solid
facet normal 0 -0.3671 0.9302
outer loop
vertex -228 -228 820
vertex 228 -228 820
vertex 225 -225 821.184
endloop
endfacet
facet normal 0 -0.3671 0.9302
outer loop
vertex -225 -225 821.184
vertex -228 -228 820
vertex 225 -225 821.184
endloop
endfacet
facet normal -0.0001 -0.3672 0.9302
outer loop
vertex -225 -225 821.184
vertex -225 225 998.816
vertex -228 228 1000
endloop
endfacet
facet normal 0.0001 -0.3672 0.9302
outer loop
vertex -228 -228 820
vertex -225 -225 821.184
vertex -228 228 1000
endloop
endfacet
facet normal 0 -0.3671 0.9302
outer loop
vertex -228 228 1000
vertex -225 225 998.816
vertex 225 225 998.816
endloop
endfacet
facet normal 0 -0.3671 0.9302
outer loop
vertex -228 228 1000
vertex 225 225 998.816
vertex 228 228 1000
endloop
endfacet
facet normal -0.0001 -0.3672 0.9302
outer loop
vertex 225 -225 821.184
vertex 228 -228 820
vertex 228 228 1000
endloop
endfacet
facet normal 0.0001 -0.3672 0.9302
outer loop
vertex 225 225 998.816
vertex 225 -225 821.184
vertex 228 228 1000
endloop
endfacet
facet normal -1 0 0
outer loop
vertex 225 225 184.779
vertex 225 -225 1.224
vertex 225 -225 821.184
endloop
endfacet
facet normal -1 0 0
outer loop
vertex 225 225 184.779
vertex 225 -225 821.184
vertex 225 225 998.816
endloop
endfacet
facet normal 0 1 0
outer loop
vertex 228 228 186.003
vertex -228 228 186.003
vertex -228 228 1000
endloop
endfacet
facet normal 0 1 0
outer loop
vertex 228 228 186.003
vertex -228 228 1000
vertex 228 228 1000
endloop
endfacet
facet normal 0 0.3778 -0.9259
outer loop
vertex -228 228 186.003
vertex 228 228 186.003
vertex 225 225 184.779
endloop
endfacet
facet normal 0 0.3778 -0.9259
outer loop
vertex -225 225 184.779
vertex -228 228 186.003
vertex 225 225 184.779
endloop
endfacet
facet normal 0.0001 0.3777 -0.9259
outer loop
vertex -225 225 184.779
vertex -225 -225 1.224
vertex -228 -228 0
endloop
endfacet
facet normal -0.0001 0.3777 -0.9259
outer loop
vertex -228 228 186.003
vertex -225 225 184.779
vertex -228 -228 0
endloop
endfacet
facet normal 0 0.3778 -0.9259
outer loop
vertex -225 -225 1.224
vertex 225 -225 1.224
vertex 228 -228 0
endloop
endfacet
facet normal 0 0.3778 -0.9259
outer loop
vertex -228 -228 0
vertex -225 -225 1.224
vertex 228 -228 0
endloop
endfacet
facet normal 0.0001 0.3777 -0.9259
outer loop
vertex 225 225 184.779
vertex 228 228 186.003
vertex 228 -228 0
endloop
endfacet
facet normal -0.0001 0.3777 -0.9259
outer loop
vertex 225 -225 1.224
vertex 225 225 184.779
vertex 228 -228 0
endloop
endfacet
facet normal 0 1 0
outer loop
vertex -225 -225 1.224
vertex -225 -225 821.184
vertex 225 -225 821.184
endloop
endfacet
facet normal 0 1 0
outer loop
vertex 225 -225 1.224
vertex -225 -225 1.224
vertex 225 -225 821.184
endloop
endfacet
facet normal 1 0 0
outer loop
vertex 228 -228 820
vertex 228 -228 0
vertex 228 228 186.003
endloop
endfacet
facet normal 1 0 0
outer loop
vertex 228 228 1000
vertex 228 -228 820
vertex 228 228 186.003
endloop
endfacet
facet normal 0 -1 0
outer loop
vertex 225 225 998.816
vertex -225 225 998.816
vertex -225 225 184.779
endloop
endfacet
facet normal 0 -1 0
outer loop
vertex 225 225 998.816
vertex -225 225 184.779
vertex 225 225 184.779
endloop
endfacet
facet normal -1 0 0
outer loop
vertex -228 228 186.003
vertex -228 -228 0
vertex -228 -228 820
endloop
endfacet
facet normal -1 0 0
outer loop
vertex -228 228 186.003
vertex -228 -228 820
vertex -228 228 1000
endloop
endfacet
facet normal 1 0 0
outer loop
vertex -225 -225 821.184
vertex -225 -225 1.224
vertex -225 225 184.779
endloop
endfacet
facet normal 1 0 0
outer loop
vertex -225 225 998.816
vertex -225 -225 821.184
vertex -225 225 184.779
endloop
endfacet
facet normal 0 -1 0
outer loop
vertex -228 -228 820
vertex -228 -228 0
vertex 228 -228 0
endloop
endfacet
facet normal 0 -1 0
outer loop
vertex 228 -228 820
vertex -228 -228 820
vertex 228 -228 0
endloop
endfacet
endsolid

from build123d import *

# Parameters (mm, degrees)
F0_W          = 456
F0_H          = 456
F0_W_2        = 450
F0_H_2        = 450
F2_DEPTH      = 1000
F3_DEPTH      = 228.001
F3_DEPTH_BACK = 228.001
F5_DEPTH      = 456.001


with BuildPart() as f2:
    # F0 (on Top) → F2 (new body)
    with BuildSketch(Plane.XY):
        Rectangle(F0_W, F0_H)
        Rectangle(F0_W_2, F0_H_2, mode=Mode.SUBTRACT)
    extrude(amount=F2_DEPTH)

    # F1 (on Right) → F3 (cut, two sides)
    with BuildSketch(Plane.YZ) as f3_sk:
        Polygon((-228, -173.997311), (228, -173.997311), (228, 186.002689), (-228, 0), align=None)
    extrude(amount=F3_DEPTH, mode=Mode.SUBTRACT)
    extrude(f3_sk.sketch, amount=-F3_DEPTH_BACK, mode=Mode.SUBTRACT)

    # F4 (on face) → F5 (cut, through all)
    with BuildSketch(Plane.YZ.offset(228)):
        Polygon((-228, 1000), (-228, 820), (228, 1000), align=None)
    extrude(amount=-F5_DEPTH, mode=Mode.SUBTRACT)


solid = f2.part
